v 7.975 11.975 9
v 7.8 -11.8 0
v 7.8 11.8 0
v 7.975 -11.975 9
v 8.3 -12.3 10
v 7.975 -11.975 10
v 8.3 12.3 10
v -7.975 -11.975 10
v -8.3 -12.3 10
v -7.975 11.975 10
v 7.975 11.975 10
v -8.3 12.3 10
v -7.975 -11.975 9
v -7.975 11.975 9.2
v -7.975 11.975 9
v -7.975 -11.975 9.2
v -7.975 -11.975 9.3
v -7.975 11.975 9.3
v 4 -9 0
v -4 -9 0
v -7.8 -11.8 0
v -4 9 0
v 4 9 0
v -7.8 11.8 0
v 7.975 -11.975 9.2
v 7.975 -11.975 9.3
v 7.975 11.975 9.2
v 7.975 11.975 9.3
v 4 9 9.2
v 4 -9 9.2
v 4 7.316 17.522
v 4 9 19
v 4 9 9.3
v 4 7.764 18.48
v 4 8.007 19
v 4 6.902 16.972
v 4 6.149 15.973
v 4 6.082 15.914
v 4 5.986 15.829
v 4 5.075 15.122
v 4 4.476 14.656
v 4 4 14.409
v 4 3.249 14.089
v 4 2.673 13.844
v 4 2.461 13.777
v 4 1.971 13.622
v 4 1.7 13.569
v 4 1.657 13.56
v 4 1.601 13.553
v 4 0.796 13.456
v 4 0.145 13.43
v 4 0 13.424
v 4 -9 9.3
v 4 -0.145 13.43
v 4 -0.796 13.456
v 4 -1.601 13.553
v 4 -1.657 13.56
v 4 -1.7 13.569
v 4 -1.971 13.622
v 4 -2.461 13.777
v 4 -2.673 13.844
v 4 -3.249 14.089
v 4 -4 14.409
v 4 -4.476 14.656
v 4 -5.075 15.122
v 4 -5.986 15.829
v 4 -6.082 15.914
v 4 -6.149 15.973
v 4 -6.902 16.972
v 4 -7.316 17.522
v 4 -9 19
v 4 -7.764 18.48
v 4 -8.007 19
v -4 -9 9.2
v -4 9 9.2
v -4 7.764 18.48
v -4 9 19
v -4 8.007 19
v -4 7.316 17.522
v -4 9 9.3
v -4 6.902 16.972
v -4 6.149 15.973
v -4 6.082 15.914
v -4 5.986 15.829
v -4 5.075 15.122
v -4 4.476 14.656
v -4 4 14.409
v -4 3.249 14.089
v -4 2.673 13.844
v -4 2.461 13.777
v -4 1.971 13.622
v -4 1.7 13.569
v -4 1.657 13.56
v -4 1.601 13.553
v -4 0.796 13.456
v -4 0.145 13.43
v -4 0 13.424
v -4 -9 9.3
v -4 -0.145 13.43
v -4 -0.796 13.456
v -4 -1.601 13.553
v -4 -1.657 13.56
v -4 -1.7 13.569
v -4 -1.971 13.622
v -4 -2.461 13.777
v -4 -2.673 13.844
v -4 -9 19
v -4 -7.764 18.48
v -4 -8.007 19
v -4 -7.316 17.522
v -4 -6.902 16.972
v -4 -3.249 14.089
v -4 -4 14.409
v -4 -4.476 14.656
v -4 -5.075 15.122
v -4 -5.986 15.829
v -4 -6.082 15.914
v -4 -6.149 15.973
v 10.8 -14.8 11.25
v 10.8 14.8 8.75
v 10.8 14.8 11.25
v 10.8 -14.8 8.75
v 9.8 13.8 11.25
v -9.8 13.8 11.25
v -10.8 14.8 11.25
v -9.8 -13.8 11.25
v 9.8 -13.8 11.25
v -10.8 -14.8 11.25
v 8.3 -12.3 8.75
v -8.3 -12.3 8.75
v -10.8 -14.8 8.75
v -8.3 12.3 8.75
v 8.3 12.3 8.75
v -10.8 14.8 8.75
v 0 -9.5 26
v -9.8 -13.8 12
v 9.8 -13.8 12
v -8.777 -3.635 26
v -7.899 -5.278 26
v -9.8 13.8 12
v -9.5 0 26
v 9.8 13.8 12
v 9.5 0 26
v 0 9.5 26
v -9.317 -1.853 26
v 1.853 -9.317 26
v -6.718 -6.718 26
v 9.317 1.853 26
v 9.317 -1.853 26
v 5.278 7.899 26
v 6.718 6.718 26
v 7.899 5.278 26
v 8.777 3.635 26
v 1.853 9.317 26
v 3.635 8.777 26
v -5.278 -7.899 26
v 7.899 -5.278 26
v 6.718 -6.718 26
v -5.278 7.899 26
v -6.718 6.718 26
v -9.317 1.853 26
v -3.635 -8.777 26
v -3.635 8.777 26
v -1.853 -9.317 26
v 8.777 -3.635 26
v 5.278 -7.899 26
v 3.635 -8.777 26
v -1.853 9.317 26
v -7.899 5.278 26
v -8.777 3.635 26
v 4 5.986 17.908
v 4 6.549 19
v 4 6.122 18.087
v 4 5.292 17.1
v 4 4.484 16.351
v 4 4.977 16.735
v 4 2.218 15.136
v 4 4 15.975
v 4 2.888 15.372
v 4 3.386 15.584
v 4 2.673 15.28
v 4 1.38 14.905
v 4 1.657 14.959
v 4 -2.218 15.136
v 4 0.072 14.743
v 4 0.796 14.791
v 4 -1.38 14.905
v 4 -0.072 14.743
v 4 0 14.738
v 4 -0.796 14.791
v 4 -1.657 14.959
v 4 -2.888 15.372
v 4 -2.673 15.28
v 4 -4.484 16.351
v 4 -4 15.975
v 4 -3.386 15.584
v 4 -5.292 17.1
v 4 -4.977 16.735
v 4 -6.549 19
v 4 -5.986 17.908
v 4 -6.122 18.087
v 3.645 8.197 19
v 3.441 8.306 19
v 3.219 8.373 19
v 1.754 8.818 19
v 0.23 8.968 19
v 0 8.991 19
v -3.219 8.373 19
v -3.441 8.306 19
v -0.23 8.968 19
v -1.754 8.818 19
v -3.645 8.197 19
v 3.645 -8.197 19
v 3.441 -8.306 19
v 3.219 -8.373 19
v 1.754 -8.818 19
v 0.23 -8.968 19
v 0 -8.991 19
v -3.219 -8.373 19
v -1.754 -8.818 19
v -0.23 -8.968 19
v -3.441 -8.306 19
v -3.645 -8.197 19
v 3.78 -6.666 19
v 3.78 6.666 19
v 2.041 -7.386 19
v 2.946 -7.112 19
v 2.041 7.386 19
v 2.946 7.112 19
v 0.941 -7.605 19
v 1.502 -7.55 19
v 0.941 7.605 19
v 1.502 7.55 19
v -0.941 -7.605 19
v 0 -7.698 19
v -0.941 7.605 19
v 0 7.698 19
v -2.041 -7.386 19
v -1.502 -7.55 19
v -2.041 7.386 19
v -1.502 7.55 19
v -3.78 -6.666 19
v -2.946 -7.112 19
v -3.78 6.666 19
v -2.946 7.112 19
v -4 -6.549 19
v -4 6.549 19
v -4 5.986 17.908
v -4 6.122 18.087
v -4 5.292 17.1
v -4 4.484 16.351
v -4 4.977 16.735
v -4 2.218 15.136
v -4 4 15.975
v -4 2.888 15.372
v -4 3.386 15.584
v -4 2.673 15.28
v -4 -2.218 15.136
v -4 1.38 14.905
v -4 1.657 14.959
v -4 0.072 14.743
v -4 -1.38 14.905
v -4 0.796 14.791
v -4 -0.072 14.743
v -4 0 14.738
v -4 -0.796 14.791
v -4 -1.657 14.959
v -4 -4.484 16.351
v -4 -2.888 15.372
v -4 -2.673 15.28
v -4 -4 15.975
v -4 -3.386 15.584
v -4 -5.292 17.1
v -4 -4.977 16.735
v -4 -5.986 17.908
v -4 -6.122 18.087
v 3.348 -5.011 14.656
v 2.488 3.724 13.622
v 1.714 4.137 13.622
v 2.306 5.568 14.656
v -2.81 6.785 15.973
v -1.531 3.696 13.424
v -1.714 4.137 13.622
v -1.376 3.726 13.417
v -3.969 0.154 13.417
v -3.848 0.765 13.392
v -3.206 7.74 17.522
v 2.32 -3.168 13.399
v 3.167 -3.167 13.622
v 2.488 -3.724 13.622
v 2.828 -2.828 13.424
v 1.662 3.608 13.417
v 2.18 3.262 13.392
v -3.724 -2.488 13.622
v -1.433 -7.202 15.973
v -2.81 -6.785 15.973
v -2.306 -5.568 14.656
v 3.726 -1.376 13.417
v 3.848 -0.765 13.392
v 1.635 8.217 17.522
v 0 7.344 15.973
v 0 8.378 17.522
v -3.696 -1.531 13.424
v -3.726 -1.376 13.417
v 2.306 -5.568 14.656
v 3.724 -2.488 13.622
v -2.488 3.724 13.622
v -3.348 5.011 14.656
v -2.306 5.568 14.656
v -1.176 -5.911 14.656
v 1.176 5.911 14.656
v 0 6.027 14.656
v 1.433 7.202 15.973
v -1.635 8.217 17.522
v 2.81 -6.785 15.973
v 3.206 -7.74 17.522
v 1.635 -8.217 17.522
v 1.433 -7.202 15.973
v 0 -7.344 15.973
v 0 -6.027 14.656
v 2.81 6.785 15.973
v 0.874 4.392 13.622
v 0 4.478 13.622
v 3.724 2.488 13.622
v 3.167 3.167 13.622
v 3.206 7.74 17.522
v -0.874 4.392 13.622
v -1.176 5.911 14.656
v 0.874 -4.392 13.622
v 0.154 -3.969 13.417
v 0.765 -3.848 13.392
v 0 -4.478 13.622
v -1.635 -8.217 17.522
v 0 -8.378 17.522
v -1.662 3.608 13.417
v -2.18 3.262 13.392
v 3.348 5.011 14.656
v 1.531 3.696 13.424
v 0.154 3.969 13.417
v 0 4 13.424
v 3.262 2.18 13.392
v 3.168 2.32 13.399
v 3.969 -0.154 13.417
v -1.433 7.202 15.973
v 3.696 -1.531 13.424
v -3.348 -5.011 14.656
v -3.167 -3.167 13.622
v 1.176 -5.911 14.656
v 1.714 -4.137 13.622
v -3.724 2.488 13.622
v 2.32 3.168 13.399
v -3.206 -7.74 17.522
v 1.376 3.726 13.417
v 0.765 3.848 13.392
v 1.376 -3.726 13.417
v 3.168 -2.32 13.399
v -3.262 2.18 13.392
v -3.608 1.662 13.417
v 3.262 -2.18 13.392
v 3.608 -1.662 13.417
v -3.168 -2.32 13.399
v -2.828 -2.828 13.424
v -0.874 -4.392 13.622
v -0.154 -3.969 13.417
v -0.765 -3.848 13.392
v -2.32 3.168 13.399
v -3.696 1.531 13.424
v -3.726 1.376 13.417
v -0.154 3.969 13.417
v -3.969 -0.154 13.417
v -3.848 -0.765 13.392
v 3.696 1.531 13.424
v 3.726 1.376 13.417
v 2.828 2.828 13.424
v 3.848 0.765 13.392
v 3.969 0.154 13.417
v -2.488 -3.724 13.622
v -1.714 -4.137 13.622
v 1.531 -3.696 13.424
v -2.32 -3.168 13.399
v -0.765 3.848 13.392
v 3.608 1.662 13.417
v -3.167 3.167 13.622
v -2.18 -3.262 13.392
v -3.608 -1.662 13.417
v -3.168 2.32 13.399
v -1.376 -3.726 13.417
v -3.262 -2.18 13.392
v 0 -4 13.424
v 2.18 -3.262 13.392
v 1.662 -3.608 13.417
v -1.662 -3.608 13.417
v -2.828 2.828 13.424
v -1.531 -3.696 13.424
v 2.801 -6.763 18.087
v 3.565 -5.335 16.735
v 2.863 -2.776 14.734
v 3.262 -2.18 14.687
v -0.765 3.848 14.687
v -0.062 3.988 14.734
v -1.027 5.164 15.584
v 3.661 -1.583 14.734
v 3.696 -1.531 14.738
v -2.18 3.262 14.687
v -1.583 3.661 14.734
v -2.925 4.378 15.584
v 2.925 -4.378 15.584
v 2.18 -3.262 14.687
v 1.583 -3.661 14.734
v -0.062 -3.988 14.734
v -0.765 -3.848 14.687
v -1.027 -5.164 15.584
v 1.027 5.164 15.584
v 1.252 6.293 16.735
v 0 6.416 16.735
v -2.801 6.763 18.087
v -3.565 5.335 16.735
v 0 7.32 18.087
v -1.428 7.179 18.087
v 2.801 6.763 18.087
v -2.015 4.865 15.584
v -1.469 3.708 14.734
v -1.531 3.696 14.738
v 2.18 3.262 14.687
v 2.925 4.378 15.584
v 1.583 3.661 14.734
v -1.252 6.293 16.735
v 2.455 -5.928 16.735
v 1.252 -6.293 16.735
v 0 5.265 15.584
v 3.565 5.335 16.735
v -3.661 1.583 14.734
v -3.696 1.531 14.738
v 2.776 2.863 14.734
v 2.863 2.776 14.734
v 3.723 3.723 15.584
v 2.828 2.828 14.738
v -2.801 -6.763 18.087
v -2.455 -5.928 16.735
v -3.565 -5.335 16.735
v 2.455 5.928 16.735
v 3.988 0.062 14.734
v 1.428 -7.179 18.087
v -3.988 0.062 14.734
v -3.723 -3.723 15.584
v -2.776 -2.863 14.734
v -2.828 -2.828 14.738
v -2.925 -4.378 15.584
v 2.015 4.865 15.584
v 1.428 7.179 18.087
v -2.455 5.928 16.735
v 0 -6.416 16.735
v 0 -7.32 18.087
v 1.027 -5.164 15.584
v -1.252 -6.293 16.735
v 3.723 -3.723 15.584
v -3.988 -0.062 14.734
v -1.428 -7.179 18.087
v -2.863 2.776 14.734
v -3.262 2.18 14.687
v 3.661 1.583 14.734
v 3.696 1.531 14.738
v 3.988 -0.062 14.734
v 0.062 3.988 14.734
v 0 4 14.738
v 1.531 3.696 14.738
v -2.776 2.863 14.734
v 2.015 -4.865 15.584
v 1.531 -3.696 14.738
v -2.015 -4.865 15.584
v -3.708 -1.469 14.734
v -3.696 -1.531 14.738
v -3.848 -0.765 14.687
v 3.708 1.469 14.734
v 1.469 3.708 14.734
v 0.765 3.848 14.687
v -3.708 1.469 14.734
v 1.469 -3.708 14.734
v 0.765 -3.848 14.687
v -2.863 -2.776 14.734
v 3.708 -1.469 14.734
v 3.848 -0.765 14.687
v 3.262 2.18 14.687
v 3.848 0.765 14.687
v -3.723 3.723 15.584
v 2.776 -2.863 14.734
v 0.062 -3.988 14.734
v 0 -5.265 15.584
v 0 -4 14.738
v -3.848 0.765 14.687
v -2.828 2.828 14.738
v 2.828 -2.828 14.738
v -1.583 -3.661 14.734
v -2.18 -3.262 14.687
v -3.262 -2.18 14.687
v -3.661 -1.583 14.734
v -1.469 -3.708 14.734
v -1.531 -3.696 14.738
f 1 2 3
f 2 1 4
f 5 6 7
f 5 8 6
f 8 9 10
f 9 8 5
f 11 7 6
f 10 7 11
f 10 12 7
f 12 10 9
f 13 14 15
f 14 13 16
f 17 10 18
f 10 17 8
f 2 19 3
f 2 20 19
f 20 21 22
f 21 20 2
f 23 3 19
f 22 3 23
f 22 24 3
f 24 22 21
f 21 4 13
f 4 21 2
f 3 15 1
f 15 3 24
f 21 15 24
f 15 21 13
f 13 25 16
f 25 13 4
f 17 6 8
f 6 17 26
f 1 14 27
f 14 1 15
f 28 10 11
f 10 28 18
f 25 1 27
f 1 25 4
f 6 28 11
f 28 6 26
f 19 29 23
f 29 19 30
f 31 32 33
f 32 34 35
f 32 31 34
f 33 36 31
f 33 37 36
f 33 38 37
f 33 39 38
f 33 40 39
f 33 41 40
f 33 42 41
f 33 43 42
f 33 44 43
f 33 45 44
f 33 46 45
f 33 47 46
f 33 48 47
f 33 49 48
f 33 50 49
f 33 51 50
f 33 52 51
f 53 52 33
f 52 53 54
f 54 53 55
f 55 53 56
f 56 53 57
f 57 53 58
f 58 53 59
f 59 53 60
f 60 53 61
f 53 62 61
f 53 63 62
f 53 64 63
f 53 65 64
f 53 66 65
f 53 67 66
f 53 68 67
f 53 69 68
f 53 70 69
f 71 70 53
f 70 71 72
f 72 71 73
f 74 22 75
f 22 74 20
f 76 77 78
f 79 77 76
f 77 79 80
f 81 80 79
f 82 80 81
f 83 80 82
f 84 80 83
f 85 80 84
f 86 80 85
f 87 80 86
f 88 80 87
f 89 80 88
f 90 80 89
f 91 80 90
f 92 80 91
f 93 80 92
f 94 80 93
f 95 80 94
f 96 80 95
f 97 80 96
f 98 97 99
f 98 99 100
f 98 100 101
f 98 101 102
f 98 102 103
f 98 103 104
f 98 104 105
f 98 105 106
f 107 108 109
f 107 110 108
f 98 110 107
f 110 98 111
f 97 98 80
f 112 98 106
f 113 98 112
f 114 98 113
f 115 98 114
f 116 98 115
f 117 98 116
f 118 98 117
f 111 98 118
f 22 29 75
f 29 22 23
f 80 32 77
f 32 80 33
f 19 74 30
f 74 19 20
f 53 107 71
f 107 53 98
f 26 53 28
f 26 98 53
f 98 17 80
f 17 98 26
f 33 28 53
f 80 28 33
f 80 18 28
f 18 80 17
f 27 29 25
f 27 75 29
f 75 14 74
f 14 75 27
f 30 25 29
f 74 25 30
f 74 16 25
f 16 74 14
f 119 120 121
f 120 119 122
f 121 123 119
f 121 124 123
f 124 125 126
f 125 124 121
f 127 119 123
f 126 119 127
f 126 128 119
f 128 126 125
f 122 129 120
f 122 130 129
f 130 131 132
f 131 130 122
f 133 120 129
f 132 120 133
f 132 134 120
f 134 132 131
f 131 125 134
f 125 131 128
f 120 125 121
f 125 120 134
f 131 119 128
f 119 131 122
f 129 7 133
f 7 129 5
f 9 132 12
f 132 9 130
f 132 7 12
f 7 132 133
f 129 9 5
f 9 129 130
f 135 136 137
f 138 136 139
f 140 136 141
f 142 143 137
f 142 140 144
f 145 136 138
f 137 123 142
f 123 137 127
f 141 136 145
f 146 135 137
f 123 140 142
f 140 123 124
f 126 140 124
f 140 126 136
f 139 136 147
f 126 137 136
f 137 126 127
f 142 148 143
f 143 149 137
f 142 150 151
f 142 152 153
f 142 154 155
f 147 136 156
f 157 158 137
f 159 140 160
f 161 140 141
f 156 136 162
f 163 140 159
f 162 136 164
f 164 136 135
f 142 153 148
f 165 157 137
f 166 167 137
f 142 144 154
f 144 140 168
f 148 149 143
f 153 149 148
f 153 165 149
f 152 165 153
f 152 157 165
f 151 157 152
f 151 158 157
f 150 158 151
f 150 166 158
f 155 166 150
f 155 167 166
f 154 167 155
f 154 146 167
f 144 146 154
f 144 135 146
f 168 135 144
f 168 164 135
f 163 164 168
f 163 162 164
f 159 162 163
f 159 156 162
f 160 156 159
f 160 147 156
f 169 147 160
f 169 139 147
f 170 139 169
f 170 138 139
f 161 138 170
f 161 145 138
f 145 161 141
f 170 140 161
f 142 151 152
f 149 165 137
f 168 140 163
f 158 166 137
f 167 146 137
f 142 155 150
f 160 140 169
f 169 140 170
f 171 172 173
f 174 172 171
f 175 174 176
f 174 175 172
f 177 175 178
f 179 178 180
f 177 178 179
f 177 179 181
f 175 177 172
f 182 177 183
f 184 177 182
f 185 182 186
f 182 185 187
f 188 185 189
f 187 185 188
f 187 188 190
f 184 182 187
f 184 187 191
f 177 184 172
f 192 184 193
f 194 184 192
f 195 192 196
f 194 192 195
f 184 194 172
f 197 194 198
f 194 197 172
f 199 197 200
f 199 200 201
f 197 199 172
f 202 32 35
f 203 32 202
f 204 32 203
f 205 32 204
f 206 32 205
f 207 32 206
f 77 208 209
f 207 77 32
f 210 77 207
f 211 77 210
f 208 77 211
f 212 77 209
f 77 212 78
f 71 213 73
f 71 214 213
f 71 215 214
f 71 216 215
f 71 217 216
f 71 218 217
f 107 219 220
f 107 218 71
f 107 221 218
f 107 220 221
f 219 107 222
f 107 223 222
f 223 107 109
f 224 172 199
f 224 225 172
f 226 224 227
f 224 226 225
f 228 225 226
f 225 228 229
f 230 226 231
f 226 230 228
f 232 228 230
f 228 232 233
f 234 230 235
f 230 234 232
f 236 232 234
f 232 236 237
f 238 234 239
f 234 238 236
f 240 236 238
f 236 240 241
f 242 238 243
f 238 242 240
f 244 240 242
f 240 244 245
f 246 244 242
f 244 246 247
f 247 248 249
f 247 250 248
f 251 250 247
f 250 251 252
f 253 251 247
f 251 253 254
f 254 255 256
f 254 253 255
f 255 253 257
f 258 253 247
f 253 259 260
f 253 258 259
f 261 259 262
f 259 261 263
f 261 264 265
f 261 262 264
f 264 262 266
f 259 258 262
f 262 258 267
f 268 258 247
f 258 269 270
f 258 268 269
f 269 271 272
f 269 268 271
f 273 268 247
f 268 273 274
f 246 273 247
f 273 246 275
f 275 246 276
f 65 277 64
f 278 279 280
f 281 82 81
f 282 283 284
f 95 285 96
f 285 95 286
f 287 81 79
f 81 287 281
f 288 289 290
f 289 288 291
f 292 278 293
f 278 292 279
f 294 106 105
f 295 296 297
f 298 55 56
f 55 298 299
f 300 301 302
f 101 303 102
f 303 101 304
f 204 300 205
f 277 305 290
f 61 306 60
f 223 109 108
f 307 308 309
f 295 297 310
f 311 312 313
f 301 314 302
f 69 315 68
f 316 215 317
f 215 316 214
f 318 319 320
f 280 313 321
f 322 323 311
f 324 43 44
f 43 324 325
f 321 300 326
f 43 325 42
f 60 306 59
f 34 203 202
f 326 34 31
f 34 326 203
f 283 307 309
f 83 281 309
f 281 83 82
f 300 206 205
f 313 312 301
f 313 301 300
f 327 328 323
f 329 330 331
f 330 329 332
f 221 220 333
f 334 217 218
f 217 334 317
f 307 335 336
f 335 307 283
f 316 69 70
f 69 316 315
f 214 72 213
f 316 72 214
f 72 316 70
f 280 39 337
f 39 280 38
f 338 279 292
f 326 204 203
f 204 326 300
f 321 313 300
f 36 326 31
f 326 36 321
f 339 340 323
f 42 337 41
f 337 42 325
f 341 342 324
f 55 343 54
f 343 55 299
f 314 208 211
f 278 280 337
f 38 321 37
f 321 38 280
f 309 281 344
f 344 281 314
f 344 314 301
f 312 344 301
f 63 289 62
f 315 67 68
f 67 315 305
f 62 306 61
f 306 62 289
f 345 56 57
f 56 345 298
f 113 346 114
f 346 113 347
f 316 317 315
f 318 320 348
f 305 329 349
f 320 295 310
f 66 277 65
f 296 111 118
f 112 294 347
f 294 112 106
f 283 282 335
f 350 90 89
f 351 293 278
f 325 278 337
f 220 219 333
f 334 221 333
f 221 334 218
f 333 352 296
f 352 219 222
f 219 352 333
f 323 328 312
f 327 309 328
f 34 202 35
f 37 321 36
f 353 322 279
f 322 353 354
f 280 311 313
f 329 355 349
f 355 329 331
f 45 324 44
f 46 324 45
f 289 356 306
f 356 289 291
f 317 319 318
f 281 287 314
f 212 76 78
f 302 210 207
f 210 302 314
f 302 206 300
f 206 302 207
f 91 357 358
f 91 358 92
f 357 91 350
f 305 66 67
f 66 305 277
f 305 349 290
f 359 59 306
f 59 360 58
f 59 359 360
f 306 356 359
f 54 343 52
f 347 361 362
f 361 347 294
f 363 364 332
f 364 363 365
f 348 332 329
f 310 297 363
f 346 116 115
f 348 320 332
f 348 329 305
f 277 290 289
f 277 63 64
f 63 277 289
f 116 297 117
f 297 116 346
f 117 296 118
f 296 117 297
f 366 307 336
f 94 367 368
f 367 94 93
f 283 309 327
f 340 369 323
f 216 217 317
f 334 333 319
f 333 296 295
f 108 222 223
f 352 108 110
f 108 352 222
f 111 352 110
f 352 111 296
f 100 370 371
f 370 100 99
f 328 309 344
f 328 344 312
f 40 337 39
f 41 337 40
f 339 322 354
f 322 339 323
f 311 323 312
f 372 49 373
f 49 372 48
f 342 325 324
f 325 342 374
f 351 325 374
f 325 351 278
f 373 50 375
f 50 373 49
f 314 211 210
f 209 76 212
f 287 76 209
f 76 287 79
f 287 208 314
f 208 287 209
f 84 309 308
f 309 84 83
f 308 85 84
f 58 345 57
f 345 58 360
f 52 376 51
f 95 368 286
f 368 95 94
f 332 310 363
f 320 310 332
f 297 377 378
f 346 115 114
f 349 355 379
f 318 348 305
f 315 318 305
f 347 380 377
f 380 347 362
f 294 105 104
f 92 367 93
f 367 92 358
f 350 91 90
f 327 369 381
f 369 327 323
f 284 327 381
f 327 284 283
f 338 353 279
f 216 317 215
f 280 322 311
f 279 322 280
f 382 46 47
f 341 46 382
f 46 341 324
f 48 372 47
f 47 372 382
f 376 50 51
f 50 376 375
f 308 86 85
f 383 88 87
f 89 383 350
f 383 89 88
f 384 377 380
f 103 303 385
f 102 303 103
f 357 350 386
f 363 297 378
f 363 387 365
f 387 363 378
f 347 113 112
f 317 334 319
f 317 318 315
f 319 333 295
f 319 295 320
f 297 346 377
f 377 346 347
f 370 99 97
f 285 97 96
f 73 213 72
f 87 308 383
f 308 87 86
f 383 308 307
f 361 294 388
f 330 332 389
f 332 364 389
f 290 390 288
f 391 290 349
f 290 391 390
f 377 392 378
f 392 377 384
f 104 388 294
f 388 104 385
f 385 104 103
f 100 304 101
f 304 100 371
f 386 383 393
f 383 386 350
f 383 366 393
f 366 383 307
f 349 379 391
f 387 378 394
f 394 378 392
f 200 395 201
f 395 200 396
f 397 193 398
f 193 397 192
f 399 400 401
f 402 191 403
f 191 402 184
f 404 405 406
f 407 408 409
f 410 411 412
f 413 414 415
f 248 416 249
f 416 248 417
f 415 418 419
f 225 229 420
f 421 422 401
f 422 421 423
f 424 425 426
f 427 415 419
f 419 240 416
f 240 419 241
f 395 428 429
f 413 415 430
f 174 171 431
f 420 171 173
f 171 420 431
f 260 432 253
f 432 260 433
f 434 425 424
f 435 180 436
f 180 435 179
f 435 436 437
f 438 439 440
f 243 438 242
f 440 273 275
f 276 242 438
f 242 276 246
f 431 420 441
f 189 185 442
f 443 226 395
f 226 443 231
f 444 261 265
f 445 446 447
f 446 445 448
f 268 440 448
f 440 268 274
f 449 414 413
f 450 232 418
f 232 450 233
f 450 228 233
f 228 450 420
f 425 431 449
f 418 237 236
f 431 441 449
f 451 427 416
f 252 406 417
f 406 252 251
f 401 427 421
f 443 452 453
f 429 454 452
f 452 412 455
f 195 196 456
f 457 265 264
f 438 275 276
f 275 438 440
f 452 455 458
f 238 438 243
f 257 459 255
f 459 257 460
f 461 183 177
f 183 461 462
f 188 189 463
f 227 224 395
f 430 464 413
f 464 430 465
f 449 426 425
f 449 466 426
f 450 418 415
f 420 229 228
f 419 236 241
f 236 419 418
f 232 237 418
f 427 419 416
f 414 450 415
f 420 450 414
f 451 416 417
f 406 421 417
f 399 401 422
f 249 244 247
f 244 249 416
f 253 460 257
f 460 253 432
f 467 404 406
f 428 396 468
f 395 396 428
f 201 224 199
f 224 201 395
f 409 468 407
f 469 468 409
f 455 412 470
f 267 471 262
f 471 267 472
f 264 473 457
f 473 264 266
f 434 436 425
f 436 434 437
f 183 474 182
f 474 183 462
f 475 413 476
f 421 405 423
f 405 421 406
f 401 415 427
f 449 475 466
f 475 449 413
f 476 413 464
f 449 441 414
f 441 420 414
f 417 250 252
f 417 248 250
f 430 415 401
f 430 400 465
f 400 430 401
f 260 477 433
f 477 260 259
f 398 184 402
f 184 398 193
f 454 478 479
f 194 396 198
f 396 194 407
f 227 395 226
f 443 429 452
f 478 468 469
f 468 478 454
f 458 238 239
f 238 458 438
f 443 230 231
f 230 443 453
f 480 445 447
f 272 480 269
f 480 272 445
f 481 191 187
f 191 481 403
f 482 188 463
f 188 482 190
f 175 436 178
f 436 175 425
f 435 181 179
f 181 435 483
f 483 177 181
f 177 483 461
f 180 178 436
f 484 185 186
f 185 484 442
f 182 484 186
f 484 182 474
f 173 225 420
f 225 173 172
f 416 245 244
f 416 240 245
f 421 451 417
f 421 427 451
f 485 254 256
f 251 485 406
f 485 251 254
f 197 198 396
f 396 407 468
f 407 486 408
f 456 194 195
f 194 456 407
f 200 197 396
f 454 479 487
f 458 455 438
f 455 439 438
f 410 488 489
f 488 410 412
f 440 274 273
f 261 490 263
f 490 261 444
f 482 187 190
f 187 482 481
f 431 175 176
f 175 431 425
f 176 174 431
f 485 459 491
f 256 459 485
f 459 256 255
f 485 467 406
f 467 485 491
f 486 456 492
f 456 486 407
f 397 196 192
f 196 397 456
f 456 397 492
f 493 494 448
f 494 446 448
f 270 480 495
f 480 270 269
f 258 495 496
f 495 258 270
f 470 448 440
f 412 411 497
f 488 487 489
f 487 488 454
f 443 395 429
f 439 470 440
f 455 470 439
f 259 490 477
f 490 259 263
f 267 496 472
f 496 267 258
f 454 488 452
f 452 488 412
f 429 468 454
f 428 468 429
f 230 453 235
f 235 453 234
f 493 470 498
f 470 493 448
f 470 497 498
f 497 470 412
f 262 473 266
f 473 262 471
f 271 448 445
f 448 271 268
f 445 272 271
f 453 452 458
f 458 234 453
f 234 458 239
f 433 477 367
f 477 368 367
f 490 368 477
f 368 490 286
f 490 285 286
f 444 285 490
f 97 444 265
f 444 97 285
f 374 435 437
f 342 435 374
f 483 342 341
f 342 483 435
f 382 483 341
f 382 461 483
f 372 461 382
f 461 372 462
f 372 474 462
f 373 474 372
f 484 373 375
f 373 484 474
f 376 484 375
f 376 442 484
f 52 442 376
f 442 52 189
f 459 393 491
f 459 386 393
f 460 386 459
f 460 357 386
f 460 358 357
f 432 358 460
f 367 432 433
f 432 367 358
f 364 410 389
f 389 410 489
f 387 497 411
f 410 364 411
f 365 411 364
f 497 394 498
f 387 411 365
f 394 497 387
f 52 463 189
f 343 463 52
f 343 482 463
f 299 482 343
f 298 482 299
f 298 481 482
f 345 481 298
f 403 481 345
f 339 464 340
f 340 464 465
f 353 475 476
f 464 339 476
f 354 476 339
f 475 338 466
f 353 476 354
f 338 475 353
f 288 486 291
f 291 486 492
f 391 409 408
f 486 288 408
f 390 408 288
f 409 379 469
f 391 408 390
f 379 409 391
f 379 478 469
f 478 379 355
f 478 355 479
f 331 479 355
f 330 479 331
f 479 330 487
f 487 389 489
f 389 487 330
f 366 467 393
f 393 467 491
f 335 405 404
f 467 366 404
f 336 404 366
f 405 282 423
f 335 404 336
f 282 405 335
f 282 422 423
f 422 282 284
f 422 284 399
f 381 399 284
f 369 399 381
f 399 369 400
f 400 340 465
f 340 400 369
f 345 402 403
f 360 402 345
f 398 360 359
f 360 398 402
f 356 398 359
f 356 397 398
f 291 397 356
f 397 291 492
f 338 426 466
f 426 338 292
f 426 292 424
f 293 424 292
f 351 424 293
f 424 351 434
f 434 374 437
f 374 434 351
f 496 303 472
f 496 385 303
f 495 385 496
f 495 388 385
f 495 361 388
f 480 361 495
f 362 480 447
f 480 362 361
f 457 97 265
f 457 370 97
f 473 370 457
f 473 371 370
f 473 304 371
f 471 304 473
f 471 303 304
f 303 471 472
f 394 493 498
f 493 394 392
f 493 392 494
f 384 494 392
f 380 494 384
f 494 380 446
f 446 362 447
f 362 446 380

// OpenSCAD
// file: sleds.scad
// ==========================================
// Xentient Framework - Universal Sled & Socket Library
// Shared modules for all peripheral caps
// ==========================================
// Per Framework §2: Universal Mating Protocol
// Female Socket (in hub): 24.4×16.4×10.0mm (0.4mm clearance), wire channel 18×8mm
// Male Sled (on cap base): 23.6×15.6×10.0mm, 1° draft, hollow 18×8mm
// Flange: +3mm each side (increased from +2mm for bearing strength)
// Units: mm

$fn = 64;

// ==========================================
// MALE SLED PARAMETERS
// ==========================================

Sled_W       = 23.6;    // Width (0.4mm tolerance in female 24.0mm)
Sled_H       = 15.6;    // Height (0.4mm tolerance in female 16.0mm)
Sled_D       = 10.0;    // Depth (insertion length)
Sled_Draft   = 1.0;     // 1-degree draft angle
Sled_Wire_W  = 18.0;    // Wire pass-through width
Sled_Wire_H  = 8.0;     // Wire pass-through height
Sled_Wall    = 2.0;     // Minimum wall thickness

// Derived
Sled_Draft_Off = Sled_D * tan(Sled_Draft);  // ~0.17mm per side

// ==========================================
// MODULE: male_sled()
// The plug base that inserts into the hub's female socket.
// All caps start with this at their base.
//
// Usage: difference() { male_sled(); /* your cap-specific cutouts */ }
// ==========================================

module male_sled() {
    difference() {
        // Outer body with 1° draft
        hull() {
            // Entry face (slightly larger for wedge fit)
            translate([0, 0, Sled_D - 0.5])
                cube([Sled_H + 2*Sled_Draft_Off,
                      Sled_W + 2*Sled_Draft_Off,
                      1], center=true);
            // Inner face (exact size)
            translate([0, 0, 0.5])
                cube([Sled_H, Sled_W, 1], center=true);
        }

        // Wire pass-through (hollow core)
        translate([0, 0, Sled_D / 2])
            cube([Sled_Wire_H, Sled_Wire_W, Sled_D + 2], center=true);

        // Entry chamfer (45° for easy insertion)
        chamfer_h = 1.5;
        translate([0, 0, Sled_D - chamfer_h/2])
            hull() {
                cube([Sled_H + 2*chamfer_h, Sled_W + 2*chamfer_h, 0.1], center=true);
                cube([Sled_H, Sled_W, 0.1], center=true);
            }
    }
}

// ==========================================
// MODULE: male_sled_with_flange()
// Adds a flange around the sled base for cap-to-hub transition.
// Flange sits flush against hub exterior face.
//
// flange_w: extra width beyond sled on each side
// flange_h: extra height beyond sled on each side
// flange_t: flange thickness
// ==========================================

module male_sled_with_flange(flange_w=3.0, flange_h=3.0, flange_t=2.0) {
    union() {
        male_sled();

        // Flange ring around sled entry
        translate([0, 0, Sled_D])
            difference() {
                cube([Sled_H + 2*flange_h,
                      Sled_W + 2*flange_w,
                      flange_t], center=true);
                // Cut sled opening through flange
                cube([Sled_H + 1, Sled_W + 1, flange_t + 2], center=true);
            }
    }
}

// ==========================================
// MODULE: wire_channel()
// Internal wire routing channel from sled to component.
// Extends from sled core outward through the cap body.
//
// length: distance from sled to component
// direction: "straight" or "angled"
// ==========================================

module wire_channel(length=15, direction="straight") {
    if (direction == "straight") {
        translate([0, 0, Sled_D / 2 + length / 2])
            cube([Sled_Wire_H, Sled_Wire_W, length + 1], center=true);
    }
}

// ==========================================
// VISUALIZATION HELPERS
// ==========================================

// Render just the sled for testing
// male_sled();
// main file
// ==========================================
// Xentient Framework - Housing 5: Sight (ESP32-CAM)
// Articulated ball-joint head with lens cutout
// ==========================================
// Component: ESP32-CAM-MB dual-board (40×27mm)
// Connection: 4-pin JST XH pigtail (UART: VCC, GND, TX, RX)
// Socket: 30° face (high visibility, clear line of sight)
// Per Framework §4 Housing 5
// IMPORTANT: Thin wall (<1.5mm) near WiFi antenna trace
// IMPORTANT: UART2 remap to GPIO2(TX)/GPIO12(RX) per hardware validation
// Units: mm

include <sleds.scad>;

$fn = 64;

// ==========================================
// COMPONENT DIMENSIONS
// ==========================================

CAM_Board_W  = 27.0;   // ESP32-CAM-MB board width
CAM_Board_H  = 40.0;   // ESP32-CAM-MB board height (dual-board)
CAM_Board_T  = 1.6;    // PCB thickness
CAM_Lens_D   = 8.0;    // OV2640 lens diameter
CAM_Ant_W    = 12.0;   // WiFi antenna trace width
CAM_Ant_H    = 8.0;    // WiFi antenna trace height

// Ball joint dimensions
Ball_R       = 8.0;    // Ball radius
Socket_R     = Ball_R + 1.5;  // Socket radius (1.5mm wall)
Socket_Depth = Ball_R * 0.7;  // Socket depth (captures ~70% of ball)
Artic_Range  = 25;     // Degrees of articulation each direction

// Housing dimensions
Head_W       = 32.0;   // Camera head width (27mm board + walls)
Head_H       = 45.0;   // Camera head height (40mm board + lens)
Head_D       = 14.0;   // Camera head depth
House_Wall   = 2.0;    // Standard wall
Ant_Wall     = 1.2;    // Thin wall near antenna (CRITICAL)

// ==========================================
// MODULE: housing_sight()
// Sled → Neck → Ball Socket → Camera Head
// ==========================================

module housing_sight() {
    union() {
        // Sled base with flange
        male_sled_with_flange(flange_w=3.0, flange_h=3.0, flange_t=2.5);

        // Neck from sled to ball socket
        translate([0, 0, Sled_D]) {
            difference() {
                // Neck body
                hull() {
                    translate([0, 0, 1])
                        cube([Sled_H + 4, Sled_W + 4, 2], center=true);
                    translate([0, 0, 12])
                        cylinder(h=4, d=Socket_R * 2, $fn=32);
                }
                // Wire channel through neck
                translate([0, 0, -1])
                    cube([Sled_Wire_H, Sled_Wire_W, 20], center=true);
            }

            // Ball socket base (on top of neck)
            translate([0, 0, 12]) {
                difference() {
                    // Socket housing
                    sphere(r=Socket_R, $fn=32);
                    // Ball cutout (concave)
                    sphere(r=Ball_R + 0.3, $fn=32);  // 0.3mm clearance
                    // Opening for head to rotate
                    translate([0, 0, Socket_R])
                        cube([Ball_R * 2 + 2, Ball_R * 2 + 2, Socket_R * 2], center=true);
                    // Wire channel through socket
                    translate([0, 0, -Socket_R])
                        cylinder(h=Socket_R * 2, d=Sled_Wire_H, $fn=16);
                }
            }
        }
    }
}

// ==========================================
// MODULE: camera_head()
// Separate print — snaps onto ball joint
// Per Framework: Male Sled terminates in Ball Joint.
// Camera housing features the Socket.
// This module is the camera head with ball on back.
// ==========================================

module camera_head() {
    difference() {
        union() {
            // Camera head body
            cube([Head_W, Head_H, Head_D], center=true);

            // Ball on back face (mates with socket on sled)
            translate([0, 0, -Head_D/2 - Ball_R + 1])
                sphere(r=Ball_R, $fn=32);
        }

        // Inner cavity (board + wiring)
        translate([0, 2, 0])
            cube([CAM_Board_W + 0.4, CAM_Board_H + 0.4, Head_D - 2*House_Wall], center=true);

        // Lens cutout (front face)
        translate([0, 4, Head_D/2])
            cylinder(h=House_Wall + 2, d=CAM_Lens_D + 0.3, center=true, $fn=32);

        // WiFi antenna zone — THIN WALL (CRITICAL: <1.5mm on outer face)
        // Cut a pocket behind the antenna area, leaving only Ant_Wall
        // thickness on the outer (Y+) face for WiFi signal transparency
        translate([0, Head_H/2 - Ant_Wall - 1, 0])
            cube([CAM_Ant_W + 0.4, House_Wall, Head_D + 0.4], center=true);

        // Wire channel from board area to ball
        translate([0, -5, -Head_D/2 - Ball_R])
            cylinder(h=Ball_R + Head_D/2, d=Sled_Wire_H, $fn=16);

        // M2 screw holes for board mounting (2 holes, top)
        for (sx = [-1, 1]) {
            translate([sx * (CAM_Board_W/2 - 3), -Head_H/2 + 5, 0])
                cylinder(h=Head_D + 2, d=2.4, center=true, $fn=16);
        }
    }
}

// ==========================================
// RENDER
// For testing: show both parts
// housing_sight() is the sled+socket (prints attached to hub)
// camera_head() is the head+ball (prints separately)
// ==========================================

// Render socket side (attached to sled)
housing_sight();

// Render camera head offset for visualization
%translate([0, 0, 35]) rotate([0, 180, 0]) camera_head();
